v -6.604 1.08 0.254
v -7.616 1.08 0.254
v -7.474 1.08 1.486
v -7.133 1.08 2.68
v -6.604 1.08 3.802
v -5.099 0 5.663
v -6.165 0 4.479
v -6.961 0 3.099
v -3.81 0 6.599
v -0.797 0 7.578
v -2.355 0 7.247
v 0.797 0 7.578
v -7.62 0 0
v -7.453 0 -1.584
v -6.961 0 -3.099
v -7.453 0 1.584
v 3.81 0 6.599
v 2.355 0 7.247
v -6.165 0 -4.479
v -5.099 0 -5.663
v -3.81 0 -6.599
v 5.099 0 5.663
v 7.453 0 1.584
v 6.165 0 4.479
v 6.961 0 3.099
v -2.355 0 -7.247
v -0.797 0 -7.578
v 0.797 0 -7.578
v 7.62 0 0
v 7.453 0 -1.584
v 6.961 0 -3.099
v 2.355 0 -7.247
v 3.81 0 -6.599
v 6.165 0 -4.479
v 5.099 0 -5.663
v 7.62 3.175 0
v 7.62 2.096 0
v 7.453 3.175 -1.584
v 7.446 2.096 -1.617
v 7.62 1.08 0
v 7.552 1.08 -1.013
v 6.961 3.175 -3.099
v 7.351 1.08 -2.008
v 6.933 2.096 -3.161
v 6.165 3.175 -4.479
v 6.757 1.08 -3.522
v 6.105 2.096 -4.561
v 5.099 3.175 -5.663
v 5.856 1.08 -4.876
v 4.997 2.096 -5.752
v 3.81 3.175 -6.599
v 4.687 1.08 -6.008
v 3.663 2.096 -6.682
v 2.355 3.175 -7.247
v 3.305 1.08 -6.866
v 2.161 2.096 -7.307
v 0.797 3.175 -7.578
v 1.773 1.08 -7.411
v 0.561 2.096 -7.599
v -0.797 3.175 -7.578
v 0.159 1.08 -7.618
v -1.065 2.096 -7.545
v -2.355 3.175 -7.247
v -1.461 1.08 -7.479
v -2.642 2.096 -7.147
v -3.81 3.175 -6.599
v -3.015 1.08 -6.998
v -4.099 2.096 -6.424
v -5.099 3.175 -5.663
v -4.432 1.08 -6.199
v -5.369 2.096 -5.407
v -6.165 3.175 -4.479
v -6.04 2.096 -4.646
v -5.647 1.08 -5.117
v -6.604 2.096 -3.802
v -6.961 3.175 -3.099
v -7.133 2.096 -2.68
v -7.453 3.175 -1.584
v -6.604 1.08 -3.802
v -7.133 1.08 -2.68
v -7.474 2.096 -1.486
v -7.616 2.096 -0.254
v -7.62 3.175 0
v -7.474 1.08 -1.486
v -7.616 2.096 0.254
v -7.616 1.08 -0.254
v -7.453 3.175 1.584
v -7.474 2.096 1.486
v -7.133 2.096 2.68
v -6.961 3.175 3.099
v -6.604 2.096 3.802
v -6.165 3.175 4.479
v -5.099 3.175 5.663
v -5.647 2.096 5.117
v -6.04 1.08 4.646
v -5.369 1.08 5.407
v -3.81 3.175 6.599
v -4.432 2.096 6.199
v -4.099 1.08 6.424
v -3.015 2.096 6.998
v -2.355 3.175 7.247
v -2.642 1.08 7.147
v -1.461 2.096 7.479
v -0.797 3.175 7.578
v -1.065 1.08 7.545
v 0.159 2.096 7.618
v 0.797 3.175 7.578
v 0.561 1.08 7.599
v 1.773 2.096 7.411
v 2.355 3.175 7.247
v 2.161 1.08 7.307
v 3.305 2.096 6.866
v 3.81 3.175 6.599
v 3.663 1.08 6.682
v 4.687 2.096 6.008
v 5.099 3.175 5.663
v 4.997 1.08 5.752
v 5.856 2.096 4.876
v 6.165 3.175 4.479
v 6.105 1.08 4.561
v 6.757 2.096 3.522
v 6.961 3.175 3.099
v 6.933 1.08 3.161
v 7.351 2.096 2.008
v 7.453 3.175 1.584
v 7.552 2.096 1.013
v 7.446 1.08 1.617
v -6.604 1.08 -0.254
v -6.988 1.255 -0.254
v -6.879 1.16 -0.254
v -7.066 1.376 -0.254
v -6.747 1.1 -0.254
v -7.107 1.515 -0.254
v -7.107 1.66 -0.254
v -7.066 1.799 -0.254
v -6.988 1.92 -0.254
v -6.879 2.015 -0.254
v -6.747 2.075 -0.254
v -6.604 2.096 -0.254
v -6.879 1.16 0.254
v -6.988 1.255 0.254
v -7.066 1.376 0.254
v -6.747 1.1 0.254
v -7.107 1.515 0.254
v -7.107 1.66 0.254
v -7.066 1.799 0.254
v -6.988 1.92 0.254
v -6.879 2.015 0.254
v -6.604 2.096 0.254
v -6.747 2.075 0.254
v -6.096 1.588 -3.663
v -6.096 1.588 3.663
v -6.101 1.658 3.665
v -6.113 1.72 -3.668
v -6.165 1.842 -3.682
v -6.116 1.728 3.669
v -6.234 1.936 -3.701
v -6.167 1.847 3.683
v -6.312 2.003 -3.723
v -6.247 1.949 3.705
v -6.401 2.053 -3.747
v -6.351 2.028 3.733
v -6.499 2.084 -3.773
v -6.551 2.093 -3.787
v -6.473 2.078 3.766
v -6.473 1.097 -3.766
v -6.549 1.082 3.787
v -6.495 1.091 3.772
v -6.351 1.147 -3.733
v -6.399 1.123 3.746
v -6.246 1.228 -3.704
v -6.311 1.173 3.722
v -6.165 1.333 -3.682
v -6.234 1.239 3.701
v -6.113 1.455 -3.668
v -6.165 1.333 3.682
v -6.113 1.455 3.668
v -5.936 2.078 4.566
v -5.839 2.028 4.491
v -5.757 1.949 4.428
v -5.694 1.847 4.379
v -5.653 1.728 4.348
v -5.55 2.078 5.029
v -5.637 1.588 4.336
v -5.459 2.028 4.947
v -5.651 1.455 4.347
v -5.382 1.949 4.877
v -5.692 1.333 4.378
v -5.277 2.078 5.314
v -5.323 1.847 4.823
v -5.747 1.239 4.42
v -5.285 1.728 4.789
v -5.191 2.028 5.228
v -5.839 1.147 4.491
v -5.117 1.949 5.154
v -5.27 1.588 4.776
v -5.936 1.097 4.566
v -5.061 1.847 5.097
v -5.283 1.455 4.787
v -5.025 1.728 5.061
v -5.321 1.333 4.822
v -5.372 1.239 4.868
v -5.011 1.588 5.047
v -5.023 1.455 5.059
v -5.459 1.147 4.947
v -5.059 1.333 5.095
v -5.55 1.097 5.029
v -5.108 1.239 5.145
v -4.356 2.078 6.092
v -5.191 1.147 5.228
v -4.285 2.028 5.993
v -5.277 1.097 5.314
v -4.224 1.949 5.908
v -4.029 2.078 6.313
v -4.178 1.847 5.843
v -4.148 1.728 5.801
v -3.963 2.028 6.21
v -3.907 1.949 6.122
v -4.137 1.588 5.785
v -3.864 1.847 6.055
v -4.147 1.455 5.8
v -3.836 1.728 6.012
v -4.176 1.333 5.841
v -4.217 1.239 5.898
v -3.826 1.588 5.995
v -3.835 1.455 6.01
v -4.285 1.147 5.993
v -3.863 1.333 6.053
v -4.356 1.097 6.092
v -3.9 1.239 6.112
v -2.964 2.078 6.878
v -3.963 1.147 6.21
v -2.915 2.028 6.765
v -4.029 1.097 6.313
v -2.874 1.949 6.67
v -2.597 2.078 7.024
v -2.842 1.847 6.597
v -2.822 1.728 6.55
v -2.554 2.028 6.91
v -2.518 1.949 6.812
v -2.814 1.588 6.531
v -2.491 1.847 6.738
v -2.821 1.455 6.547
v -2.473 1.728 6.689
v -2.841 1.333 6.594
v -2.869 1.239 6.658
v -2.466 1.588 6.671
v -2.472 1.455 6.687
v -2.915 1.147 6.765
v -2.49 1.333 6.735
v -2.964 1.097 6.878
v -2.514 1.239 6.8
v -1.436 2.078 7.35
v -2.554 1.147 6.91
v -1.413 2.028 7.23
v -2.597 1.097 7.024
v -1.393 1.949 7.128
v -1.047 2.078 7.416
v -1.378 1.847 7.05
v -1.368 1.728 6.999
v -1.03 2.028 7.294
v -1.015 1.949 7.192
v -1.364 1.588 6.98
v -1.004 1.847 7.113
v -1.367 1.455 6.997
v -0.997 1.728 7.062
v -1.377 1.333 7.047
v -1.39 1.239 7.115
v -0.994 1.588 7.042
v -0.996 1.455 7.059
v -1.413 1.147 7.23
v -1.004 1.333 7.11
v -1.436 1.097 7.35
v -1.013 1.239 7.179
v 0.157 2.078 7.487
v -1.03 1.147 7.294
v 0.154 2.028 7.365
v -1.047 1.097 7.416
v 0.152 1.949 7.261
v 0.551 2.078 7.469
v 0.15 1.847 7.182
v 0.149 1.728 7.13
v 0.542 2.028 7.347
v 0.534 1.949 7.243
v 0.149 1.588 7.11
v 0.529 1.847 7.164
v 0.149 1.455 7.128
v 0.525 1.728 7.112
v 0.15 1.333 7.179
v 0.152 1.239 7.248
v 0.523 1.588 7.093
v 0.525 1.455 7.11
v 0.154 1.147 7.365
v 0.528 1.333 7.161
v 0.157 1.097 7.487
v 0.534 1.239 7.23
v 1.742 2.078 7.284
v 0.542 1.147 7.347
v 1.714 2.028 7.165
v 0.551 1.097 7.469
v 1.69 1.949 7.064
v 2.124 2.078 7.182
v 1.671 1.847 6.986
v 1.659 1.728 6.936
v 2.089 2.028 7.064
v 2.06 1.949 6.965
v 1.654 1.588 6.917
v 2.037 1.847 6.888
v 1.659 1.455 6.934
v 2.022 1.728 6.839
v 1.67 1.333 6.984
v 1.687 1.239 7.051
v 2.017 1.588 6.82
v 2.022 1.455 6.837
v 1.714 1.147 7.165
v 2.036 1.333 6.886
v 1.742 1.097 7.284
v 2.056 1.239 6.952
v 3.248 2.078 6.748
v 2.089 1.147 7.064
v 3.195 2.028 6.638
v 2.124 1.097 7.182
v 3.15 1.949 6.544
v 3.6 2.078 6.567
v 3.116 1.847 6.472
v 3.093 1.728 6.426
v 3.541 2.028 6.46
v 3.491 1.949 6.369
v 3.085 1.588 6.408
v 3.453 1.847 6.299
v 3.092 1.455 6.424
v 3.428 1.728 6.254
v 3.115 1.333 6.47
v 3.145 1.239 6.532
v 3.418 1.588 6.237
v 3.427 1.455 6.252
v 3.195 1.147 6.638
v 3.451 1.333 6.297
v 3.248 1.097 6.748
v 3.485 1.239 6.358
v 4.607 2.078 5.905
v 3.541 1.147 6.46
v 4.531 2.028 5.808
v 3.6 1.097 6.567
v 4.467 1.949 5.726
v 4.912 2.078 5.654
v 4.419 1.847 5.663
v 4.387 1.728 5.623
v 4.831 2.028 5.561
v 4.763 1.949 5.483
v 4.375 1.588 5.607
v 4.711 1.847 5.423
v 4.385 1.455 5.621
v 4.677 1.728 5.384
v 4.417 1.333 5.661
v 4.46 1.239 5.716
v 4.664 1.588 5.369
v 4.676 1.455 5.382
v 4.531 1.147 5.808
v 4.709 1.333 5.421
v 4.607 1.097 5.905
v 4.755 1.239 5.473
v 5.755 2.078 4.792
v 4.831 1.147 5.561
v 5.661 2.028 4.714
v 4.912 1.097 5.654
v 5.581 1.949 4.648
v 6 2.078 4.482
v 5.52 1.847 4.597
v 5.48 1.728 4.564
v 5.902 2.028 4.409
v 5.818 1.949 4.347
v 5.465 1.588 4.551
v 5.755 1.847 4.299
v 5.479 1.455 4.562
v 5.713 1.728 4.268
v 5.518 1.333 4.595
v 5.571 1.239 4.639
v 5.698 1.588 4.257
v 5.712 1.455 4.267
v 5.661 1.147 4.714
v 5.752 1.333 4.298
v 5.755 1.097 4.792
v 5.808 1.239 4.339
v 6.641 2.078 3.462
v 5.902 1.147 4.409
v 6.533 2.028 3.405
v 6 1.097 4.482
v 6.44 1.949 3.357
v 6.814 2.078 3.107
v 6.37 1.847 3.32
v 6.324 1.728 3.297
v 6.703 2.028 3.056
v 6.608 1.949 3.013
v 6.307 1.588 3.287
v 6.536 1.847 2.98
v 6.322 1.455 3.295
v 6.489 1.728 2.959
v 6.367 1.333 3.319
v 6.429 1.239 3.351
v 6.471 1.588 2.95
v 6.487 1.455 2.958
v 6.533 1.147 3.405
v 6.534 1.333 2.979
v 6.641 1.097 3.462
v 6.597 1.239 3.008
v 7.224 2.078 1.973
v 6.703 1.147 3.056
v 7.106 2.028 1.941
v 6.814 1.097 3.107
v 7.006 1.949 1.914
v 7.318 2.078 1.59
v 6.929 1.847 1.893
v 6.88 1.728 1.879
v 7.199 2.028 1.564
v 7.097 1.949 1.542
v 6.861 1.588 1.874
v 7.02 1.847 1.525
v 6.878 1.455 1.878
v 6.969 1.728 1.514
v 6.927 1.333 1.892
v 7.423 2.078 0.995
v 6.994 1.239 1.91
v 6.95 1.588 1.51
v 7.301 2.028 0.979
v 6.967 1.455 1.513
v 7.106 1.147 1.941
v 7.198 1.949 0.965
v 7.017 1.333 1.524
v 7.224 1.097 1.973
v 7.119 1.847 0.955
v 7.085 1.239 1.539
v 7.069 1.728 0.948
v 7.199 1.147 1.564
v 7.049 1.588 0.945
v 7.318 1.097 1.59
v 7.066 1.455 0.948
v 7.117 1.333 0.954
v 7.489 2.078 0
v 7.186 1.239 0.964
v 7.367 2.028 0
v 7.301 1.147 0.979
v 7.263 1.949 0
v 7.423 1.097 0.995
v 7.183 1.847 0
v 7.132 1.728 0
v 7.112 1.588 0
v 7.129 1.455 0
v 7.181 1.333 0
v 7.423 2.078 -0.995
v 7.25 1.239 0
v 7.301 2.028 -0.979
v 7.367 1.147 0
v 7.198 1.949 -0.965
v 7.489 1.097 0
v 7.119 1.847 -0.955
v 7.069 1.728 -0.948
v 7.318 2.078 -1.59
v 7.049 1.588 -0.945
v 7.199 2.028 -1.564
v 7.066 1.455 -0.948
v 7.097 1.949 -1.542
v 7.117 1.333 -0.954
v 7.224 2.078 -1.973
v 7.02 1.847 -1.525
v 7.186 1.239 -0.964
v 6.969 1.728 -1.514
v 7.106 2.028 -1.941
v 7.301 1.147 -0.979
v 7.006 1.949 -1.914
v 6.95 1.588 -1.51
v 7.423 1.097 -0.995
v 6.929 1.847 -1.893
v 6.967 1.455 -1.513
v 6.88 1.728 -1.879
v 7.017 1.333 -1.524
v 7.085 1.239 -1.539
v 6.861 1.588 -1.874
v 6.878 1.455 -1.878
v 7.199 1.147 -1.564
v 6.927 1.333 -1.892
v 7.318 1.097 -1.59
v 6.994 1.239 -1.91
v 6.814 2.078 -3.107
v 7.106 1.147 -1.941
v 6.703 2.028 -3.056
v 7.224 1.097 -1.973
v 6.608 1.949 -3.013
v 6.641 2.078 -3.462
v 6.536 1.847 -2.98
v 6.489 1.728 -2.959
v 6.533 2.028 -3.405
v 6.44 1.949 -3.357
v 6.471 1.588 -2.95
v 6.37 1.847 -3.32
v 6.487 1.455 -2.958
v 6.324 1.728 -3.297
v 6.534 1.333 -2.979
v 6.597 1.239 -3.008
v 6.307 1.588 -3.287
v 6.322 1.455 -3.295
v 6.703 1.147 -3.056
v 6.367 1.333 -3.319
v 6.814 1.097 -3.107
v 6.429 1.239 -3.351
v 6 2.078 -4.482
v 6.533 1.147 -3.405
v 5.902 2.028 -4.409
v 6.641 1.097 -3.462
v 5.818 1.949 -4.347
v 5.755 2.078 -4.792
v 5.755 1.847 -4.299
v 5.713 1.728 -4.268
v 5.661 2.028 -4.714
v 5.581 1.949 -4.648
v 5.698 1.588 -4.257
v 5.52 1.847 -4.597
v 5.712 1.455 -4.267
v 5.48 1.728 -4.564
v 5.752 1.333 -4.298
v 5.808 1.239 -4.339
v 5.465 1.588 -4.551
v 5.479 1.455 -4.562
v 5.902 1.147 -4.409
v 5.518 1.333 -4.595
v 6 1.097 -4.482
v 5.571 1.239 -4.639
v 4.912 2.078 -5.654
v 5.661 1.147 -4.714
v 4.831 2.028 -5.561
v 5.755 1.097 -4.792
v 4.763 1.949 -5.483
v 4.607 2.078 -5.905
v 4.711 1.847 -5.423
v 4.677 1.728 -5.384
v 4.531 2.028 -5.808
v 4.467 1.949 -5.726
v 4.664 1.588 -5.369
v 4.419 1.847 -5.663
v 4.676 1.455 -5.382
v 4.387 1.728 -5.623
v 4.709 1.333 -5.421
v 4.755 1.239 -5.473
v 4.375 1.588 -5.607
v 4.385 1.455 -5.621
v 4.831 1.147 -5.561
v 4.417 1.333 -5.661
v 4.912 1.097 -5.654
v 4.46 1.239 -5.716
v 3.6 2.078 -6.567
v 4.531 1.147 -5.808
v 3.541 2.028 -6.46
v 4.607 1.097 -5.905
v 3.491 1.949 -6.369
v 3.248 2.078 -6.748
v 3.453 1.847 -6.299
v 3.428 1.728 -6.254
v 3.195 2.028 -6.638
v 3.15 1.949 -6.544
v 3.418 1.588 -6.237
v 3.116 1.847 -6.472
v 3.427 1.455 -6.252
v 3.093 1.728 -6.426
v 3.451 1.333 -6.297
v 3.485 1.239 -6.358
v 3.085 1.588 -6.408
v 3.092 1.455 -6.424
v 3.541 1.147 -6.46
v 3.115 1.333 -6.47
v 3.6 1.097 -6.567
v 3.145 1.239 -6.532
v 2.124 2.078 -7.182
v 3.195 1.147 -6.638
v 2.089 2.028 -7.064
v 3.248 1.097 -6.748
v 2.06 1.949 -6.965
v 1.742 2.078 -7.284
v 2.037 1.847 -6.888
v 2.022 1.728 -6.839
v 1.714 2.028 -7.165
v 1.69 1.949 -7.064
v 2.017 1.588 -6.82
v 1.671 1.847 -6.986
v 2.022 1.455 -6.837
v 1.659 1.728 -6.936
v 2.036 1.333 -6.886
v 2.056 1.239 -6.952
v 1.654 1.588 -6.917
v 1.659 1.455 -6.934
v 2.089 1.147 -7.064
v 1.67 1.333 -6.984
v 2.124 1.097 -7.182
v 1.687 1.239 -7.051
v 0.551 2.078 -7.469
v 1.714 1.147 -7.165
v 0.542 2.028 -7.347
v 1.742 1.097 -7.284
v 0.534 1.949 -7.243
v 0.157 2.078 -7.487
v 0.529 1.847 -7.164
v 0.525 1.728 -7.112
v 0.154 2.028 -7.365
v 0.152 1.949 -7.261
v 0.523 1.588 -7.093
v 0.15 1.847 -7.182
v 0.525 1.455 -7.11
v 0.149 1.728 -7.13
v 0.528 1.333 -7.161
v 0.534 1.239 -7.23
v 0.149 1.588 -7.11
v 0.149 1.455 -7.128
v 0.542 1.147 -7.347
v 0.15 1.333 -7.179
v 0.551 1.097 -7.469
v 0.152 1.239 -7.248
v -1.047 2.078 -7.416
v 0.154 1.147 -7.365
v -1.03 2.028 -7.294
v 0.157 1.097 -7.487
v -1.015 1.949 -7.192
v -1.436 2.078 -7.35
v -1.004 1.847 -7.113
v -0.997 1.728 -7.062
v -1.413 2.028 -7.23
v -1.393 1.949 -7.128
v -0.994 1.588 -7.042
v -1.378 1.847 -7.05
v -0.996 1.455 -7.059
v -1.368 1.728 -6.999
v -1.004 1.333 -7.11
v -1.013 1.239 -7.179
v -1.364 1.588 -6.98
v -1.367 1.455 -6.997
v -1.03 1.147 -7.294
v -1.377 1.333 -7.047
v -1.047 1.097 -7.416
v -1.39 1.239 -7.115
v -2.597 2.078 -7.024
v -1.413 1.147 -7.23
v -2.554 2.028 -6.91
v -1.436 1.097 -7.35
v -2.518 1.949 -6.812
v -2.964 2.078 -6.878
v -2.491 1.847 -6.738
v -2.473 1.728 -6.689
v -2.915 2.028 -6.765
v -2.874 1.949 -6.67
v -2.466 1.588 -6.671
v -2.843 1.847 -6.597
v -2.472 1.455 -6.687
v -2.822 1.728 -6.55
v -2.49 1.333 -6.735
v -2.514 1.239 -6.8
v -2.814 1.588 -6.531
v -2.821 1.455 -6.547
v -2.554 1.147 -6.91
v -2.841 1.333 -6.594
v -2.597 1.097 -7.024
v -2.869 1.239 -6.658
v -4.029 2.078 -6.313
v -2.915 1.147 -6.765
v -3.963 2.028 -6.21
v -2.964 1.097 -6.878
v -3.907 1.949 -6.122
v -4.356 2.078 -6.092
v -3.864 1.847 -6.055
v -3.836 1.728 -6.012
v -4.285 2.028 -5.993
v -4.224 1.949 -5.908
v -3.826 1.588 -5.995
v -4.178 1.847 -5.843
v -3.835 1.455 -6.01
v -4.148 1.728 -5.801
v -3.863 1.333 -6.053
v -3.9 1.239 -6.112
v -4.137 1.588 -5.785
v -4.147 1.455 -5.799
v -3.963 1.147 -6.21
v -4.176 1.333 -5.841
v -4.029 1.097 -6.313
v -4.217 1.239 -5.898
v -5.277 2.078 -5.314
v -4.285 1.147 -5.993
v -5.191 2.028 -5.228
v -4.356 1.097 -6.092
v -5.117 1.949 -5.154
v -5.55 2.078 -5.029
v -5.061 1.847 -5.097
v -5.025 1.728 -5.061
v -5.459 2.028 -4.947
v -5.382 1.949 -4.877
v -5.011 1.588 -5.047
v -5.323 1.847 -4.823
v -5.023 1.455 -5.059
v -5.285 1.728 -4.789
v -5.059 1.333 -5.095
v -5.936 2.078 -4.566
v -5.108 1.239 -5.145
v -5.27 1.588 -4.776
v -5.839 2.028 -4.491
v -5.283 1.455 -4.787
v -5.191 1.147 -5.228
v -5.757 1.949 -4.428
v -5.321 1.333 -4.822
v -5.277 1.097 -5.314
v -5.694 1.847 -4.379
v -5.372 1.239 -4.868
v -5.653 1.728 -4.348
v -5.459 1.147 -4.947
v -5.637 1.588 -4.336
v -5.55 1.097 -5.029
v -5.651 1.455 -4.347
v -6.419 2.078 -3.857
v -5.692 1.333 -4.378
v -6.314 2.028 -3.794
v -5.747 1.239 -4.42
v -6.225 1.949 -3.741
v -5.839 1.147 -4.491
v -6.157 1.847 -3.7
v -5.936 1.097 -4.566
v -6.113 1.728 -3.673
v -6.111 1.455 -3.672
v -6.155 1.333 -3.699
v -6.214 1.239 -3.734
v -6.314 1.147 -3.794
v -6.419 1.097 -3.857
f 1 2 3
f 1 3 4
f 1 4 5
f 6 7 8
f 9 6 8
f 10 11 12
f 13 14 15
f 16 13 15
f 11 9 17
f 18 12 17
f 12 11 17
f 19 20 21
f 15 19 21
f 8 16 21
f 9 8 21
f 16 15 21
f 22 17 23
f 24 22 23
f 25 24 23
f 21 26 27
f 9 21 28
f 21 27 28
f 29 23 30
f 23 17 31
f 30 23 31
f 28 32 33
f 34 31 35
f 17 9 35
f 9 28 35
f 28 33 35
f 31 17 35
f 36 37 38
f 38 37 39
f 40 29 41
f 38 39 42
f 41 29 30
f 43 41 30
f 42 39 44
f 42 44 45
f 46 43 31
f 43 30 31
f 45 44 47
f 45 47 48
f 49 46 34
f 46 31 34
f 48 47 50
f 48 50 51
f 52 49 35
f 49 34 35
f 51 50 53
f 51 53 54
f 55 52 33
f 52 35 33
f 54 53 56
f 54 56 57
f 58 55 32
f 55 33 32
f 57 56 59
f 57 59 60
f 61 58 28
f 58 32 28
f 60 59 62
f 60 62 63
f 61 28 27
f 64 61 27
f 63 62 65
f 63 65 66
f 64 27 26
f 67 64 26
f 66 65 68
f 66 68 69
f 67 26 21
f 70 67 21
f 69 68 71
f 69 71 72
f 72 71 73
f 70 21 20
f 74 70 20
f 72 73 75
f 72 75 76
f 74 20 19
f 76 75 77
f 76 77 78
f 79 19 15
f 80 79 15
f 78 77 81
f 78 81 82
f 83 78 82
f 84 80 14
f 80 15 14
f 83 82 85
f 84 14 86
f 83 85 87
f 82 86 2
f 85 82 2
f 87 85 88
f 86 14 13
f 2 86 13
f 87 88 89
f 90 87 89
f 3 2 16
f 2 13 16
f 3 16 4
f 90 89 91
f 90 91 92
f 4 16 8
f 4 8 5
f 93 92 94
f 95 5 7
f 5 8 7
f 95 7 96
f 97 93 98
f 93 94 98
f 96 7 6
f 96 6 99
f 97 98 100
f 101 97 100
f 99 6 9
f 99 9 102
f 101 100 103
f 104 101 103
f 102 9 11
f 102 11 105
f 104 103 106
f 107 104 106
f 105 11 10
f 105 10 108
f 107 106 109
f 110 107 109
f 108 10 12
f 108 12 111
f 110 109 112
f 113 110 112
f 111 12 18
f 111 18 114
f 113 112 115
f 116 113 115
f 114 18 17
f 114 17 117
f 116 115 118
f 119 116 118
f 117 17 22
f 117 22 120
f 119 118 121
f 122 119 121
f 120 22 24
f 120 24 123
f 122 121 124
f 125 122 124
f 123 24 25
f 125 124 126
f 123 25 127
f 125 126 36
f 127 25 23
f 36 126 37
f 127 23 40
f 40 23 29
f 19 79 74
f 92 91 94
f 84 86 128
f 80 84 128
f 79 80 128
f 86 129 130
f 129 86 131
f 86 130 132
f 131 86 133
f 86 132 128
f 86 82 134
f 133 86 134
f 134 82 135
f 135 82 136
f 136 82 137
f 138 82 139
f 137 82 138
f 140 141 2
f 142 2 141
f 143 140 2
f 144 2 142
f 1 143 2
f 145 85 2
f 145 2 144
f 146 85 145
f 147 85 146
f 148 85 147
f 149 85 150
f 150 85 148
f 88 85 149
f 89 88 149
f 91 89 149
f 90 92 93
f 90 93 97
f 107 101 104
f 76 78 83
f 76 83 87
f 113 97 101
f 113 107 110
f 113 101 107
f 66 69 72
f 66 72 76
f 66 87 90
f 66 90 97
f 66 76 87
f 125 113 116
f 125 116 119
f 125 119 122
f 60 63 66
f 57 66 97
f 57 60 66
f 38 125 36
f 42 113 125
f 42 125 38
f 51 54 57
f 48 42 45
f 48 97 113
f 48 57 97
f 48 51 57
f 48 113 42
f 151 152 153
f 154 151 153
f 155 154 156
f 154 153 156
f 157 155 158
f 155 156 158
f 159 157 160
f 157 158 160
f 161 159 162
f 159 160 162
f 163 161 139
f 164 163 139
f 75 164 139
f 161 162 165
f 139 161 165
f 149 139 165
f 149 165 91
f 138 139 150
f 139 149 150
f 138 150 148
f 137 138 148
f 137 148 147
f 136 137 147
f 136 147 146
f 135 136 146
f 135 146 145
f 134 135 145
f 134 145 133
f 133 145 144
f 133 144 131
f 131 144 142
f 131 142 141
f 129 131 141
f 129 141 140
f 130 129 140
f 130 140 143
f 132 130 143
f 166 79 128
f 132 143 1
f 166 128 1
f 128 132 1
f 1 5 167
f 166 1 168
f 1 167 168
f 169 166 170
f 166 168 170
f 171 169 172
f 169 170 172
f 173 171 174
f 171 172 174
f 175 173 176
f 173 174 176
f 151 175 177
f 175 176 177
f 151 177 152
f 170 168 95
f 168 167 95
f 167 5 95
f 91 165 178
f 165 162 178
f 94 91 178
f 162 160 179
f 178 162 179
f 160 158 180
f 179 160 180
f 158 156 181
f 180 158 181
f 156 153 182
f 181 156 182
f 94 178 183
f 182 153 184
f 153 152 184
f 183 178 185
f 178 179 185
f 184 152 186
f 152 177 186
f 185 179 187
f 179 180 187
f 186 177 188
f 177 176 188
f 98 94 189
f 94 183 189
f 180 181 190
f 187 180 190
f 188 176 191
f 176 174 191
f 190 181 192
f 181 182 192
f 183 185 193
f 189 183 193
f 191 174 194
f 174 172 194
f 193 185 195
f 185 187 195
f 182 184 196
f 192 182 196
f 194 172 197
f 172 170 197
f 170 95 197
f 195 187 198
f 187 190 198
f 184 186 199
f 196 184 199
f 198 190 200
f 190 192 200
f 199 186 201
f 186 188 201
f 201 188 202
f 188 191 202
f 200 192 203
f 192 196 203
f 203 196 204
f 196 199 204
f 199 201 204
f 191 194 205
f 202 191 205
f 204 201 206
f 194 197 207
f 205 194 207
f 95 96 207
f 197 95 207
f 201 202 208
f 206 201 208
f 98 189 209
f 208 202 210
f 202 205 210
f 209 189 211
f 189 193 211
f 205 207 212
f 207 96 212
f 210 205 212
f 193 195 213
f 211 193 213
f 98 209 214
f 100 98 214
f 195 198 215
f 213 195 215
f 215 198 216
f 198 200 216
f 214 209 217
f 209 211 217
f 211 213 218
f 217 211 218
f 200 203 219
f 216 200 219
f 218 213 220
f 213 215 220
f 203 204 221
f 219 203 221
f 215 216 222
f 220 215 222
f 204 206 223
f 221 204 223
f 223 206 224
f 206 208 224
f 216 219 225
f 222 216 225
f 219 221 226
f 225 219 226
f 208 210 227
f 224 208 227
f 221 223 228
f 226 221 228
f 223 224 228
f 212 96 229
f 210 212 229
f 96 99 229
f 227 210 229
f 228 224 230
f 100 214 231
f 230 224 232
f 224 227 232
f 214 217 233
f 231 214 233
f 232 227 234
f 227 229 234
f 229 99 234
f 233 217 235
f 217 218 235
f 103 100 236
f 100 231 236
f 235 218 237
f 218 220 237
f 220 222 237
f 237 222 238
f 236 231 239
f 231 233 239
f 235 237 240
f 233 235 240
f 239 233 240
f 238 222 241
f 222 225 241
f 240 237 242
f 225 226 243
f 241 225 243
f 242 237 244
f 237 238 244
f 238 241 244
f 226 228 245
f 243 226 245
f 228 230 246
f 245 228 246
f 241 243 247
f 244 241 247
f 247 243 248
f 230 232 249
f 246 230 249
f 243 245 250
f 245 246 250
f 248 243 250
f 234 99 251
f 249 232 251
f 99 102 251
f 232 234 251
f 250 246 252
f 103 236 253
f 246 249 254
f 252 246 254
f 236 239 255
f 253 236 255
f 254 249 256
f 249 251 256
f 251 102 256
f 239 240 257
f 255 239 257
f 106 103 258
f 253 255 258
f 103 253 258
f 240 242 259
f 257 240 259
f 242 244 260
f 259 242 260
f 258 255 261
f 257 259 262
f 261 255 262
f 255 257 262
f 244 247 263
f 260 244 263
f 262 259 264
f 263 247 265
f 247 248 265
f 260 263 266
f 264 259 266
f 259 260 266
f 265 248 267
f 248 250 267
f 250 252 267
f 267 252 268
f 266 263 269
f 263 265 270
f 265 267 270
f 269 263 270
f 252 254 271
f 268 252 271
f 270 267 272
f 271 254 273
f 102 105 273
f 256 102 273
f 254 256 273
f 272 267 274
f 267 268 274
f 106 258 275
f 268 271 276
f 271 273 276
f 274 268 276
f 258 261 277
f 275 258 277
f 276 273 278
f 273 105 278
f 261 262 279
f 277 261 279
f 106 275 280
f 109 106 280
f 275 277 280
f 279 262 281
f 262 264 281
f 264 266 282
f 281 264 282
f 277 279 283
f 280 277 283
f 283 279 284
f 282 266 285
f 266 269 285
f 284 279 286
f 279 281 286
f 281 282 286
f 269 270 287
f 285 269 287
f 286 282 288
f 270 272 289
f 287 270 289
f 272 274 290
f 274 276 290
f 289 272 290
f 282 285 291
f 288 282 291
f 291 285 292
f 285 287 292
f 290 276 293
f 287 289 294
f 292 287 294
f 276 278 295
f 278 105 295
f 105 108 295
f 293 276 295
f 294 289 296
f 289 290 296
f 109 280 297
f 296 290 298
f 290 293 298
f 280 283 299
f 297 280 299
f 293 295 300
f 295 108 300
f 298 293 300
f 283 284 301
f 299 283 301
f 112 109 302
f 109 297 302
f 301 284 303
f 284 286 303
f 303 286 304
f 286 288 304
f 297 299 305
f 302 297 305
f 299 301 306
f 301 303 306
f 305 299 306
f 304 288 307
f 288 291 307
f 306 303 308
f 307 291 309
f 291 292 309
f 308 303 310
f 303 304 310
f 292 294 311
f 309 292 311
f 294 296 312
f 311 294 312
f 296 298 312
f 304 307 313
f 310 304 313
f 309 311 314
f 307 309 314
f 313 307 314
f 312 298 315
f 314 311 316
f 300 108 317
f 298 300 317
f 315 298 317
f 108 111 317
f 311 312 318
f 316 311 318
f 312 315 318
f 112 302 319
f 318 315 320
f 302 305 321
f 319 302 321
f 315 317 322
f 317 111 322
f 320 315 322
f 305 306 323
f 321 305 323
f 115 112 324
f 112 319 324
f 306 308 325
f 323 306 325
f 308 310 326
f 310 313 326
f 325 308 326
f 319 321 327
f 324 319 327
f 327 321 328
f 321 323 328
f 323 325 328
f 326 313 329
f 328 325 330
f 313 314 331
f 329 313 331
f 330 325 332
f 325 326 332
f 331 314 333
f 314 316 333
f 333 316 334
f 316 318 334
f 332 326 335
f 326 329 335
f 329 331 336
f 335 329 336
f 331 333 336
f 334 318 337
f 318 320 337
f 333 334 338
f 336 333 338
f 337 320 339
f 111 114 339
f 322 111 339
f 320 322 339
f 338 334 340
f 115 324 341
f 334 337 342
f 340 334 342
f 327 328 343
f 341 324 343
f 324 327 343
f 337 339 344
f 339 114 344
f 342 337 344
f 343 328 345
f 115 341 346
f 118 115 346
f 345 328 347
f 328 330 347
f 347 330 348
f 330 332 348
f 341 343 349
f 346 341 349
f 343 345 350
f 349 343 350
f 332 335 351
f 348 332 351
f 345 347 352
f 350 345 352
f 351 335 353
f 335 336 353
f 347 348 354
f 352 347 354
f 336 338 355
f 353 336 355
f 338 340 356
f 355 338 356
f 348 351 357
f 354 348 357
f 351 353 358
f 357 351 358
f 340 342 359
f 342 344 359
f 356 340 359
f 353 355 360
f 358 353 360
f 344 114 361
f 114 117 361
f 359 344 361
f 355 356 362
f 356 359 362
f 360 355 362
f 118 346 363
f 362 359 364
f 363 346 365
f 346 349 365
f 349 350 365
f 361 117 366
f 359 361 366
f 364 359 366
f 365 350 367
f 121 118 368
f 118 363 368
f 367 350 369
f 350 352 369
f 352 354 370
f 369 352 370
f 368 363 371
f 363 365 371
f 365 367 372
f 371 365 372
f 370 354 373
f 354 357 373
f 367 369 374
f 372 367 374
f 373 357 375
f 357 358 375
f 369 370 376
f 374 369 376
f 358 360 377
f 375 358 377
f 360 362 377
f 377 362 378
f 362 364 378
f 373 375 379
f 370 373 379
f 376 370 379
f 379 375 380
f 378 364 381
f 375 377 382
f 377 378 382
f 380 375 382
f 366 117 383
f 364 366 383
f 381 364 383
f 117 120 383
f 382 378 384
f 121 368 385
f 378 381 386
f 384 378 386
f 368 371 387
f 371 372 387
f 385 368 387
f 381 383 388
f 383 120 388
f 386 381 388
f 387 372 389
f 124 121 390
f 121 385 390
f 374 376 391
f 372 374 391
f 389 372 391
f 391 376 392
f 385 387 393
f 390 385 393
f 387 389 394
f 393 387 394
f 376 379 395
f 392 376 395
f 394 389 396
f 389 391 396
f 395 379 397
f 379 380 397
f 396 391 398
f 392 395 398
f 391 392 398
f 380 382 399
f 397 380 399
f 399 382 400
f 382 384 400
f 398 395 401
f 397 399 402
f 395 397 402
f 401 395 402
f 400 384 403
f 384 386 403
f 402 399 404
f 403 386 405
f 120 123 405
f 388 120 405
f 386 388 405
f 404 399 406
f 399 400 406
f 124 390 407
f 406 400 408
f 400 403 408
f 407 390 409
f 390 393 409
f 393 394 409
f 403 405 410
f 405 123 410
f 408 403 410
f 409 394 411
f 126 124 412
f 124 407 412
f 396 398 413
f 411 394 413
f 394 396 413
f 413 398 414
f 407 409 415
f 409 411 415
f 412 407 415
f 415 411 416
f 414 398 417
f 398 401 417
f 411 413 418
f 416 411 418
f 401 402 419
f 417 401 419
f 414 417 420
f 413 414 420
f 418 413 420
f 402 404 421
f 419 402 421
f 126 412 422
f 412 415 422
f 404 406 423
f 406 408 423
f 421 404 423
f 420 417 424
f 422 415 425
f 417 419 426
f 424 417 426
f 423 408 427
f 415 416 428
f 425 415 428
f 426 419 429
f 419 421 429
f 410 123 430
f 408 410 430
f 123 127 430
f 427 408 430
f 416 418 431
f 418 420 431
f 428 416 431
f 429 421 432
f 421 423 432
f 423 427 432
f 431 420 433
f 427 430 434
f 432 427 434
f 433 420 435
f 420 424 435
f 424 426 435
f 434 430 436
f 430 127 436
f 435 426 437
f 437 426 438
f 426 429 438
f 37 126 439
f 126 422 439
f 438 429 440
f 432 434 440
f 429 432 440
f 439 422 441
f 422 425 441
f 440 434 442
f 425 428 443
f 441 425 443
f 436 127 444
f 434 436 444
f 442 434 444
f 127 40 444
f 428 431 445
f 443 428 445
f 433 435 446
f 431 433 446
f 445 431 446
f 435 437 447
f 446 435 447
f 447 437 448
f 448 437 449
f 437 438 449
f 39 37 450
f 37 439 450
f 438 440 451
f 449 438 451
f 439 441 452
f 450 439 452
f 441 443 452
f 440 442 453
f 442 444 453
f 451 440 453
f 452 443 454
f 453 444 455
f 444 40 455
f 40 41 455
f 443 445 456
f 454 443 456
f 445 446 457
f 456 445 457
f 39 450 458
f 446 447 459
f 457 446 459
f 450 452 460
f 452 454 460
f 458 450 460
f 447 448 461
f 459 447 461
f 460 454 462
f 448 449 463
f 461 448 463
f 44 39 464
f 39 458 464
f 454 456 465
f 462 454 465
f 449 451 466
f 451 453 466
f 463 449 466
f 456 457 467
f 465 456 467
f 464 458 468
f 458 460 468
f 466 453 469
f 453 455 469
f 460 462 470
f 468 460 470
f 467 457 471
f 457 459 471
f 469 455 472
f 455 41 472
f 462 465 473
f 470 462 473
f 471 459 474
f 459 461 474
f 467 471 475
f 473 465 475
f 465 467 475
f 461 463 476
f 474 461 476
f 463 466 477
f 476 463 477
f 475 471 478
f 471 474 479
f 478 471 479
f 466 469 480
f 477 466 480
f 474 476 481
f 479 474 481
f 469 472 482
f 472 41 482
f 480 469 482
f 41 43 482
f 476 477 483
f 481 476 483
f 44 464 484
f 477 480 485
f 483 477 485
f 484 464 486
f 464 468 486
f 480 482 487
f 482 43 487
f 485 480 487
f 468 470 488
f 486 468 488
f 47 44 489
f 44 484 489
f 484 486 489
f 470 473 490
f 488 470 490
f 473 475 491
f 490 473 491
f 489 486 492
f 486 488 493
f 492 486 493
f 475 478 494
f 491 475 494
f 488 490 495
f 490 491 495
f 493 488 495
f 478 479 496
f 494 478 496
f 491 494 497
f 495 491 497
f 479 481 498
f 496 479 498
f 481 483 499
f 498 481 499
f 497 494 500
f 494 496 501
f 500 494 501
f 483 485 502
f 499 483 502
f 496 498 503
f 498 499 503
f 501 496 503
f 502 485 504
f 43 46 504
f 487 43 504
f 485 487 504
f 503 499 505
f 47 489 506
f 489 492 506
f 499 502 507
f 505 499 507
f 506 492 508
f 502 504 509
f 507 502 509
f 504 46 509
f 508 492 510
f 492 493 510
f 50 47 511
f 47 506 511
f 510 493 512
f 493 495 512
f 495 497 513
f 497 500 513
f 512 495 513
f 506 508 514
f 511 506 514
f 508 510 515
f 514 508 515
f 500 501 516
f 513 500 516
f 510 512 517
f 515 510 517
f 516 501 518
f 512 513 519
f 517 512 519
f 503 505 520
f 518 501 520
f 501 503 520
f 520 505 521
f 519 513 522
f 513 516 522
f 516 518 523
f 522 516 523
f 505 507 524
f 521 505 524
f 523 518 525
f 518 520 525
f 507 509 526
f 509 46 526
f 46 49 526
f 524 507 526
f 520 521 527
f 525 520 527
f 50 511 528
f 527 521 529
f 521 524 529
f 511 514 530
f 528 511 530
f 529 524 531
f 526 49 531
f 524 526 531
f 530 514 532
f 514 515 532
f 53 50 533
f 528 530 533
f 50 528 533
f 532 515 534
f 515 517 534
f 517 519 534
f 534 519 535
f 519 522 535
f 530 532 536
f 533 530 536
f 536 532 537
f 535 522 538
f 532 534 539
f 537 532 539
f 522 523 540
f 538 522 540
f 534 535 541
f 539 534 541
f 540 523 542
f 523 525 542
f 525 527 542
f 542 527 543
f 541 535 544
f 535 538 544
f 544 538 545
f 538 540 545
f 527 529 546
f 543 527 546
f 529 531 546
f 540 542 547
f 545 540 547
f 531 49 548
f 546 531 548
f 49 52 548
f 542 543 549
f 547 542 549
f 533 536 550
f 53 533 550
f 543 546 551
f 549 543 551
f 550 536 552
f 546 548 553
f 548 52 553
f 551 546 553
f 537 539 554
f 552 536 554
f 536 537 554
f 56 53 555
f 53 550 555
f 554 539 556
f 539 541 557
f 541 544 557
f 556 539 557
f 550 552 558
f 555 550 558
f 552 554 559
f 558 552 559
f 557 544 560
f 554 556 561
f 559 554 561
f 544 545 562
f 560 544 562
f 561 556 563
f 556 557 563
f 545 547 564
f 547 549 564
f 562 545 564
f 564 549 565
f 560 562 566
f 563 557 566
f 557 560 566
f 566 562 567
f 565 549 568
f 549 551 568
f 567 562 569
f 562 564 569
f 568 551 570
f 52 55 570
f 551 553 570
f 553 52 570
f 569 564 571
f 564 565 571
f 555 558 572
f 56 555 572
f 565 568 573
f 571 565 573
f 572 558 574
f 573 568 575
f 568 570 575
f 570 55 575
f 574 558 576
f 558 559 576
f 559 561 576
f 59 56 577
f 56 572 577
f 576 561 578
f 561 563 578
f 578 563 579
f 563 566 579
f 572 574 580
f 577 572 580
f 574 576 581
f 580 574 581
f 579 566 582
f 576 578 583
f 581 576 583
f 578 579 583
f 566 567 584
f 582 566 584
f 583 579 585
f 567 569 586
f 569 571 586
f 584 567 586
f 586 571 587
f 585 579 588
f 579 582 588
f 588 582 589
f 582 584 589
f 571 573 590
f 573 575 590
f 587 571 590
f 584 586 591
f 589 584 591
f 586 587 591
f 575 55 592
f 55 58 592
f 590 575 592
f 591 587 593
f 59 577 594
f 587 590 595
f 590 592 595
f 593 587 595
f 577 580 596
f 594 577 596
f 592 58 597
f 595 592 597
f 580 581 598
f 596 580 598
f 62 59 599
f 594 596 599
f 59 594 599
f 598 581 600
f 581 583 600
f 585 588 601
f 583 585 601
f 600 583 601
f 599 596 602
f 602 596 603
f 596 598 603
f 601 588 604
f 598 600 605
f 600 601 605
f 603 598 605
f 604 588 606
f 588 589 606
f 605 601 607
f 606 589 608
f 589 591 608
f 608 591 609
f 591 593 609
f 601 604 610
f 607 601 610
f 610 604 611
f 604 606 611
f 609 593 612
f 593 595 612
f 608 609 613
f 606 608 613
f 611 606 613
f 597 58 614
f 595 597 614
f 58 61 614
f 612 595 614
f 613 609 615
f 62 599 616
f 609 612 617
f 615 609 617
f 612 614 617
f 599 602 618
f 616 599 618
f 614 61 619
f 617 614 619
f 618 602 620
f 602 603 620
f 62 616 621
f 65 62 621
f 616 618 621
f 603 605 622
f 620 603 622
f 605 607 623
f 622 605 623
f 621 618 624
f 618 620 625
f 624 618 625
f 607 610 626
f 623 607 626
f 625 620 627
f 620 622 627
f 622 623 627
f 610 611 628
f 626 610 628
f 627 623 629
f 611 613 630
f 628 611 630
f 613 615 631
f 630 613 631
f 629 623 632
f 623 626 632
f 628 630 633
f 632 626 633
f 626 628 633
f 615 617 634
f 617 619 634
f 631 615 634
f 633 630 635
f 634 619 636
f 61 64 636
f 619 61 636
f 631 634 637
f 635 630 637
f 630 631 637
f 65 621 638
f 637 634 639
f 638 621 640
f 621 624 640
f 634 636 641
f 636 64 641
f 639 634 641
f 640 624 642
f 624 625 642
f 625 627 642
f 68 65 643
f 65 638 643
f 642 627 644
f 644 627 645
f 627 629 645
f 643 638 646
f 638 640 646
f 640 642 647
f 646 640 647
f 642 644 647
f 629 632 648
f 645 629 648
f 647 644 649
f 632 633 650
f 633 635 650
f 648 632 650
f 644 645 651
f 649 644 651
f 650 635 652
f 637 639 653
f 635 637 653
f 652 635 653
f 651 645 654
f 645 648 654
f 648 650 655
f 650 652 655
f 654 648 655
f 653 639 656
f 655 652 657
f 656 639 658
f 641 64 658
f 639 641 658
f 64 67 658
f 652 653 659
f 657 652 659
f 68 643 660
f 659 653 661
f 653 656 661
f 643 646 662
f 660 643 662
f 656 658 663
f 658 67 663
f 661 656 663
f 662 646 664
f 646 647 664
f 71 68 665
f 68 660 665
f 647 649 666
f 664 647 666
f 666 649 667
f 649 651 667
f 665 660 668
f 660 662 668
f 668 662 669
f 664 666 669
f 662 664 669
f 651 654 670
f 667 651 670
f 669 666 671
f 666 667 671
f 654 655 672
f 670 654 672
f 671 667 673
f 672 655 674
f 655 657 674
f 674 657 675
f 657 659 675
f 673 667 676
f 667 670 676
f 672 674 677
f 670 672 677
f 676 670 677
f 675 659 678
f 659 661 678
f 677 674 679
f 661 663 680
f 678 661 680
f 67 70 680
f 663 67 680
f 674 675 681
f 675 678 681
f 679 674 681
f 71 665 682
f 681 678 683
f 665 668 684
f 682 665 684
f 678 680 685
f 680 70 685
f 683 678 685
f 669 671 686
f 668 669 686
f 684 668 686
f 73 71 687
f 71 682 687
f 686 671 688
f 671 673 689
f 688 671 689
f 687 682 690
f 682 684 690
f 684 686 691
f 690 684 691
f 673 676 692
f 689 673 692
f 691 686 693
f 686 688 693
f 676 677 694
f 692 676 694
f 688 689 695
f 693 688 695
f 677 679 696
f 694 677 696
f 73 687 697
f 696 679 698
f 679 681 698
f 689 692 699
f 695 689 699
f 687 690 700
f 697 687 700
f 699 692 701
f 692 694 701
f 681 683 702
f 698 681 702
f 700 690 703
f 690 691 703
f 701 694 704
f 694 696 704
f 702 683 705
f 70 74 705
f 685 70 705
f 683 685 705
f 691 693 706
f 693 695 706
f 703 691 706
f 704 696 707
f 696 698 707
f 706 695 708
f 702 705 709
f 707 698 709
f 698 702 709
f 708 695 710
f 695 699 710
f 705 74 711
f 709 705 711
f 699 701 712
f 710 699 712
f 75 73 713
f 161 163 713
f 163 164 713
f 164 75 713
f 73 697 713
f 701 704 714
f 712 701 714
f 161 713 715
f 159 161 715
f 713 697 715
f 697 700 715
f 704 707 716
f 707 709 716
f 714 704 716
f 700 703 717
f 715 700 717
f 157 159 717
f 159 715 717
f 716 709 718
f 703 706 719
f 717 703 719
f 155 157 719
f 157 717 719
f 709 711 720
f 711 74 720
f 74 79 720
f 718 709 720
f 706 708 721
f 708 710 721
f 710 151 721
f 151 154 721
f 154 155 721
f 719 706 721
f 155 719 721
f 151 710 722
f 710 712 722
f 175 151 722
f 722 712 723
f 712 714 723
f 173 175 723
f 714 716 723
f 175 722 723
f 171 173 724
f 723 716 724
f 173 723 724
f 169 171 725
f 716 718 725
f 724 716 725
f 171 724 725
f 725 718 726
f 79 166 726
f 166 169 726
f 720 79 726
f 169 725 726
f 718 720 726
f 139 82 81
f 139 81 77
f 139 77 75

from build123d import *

# Parameters (mm, degrees)
SKETCH1_R           = 7.62
BOSS_EXTRUDE1_DEPTH = 3.175
SKETCH3_R           = 0.508
CUT_EXTRUDE1_DEPTH  = 25.4
SKETCH6_W           = 1.220456994
SKETCH6_H           = 1.016
CUT_EXTRUDE2_DEPTH  = 7.366
SKETCH7_W           = 1.220456994
SKETCH7_H           = 1.016
CUT_EXTRUDE3_DEPTH  = 7.366
SKETCH4_R           = 0.508


with BuildPart() as part:
    # Sketch1 → Boss-Extrude1 (new body)
    with BuildSketch(Plane(origin=(0, 0, 0), x_dir=(1, 0, 0), z_dir=(0, 1, 0))):
        Circle(SKETCH1_R)
    extrude(amount=BOSS_EXTRUDE1_DEPTH)

    # Sketch3 → Cut-Extrude1 (cut, symmetric)
    with BuildSketch(Plane.XY):
        with Locations((-6.604, 1.5875)):
            Circle(SKETCH3_R)
    extrude(amount=CUT_EXTRUDE1_DEPTH, both=True, mode=Mode.SUBTRACT)

    # Sketch6 → Cut-Extrude2 (cut)
    with BuildSketch(Plane.XY.offset(-7.62)):
        with Locations((-7.214228497, 1.5875)):
            Rectangle(SKETCH6_W, SKETCH6_H)
    extrude(amount=CUT_EXTRUDE2_DEPTH, mode=Mode.SUBTRACT)

    # Sketch7 → Cut-Extrude3 (cut)
    with BuildSketch(Plane.XY.offset(7.62)):
        with Locations((-7.214228497, 1.5875)):
            Rectangle(SKETCH7_W, SKETCH7_H)
    extrude(amount=-CUT_EXTRUDE3_DEPTH, mode=Mode.SUBTRACT)

    # Cut-Sweep1: sweep along a path in Sketch5
    with BuildLine(Plane(origin=(0, 0, 0), x_dir=(1, 0, 0), z_dir=(0, 1, 0))) as cut_sweep1_path:
        ThreePointArc((-7.554809844, -0.994609585), (7.62, 0), (-7.554809844, 0.994609585))
    # Sketch4 → Cut-Sweep1 (sweep, cut)
    with BuildSketch(Plane.XY):
        with Locations((7.62, 1.5875)):
            Circle(SKETCH4_R)
    sweep(path=cut_sweep1_path.line, mode=Mode.SUBTRACT)


solid = part.part
